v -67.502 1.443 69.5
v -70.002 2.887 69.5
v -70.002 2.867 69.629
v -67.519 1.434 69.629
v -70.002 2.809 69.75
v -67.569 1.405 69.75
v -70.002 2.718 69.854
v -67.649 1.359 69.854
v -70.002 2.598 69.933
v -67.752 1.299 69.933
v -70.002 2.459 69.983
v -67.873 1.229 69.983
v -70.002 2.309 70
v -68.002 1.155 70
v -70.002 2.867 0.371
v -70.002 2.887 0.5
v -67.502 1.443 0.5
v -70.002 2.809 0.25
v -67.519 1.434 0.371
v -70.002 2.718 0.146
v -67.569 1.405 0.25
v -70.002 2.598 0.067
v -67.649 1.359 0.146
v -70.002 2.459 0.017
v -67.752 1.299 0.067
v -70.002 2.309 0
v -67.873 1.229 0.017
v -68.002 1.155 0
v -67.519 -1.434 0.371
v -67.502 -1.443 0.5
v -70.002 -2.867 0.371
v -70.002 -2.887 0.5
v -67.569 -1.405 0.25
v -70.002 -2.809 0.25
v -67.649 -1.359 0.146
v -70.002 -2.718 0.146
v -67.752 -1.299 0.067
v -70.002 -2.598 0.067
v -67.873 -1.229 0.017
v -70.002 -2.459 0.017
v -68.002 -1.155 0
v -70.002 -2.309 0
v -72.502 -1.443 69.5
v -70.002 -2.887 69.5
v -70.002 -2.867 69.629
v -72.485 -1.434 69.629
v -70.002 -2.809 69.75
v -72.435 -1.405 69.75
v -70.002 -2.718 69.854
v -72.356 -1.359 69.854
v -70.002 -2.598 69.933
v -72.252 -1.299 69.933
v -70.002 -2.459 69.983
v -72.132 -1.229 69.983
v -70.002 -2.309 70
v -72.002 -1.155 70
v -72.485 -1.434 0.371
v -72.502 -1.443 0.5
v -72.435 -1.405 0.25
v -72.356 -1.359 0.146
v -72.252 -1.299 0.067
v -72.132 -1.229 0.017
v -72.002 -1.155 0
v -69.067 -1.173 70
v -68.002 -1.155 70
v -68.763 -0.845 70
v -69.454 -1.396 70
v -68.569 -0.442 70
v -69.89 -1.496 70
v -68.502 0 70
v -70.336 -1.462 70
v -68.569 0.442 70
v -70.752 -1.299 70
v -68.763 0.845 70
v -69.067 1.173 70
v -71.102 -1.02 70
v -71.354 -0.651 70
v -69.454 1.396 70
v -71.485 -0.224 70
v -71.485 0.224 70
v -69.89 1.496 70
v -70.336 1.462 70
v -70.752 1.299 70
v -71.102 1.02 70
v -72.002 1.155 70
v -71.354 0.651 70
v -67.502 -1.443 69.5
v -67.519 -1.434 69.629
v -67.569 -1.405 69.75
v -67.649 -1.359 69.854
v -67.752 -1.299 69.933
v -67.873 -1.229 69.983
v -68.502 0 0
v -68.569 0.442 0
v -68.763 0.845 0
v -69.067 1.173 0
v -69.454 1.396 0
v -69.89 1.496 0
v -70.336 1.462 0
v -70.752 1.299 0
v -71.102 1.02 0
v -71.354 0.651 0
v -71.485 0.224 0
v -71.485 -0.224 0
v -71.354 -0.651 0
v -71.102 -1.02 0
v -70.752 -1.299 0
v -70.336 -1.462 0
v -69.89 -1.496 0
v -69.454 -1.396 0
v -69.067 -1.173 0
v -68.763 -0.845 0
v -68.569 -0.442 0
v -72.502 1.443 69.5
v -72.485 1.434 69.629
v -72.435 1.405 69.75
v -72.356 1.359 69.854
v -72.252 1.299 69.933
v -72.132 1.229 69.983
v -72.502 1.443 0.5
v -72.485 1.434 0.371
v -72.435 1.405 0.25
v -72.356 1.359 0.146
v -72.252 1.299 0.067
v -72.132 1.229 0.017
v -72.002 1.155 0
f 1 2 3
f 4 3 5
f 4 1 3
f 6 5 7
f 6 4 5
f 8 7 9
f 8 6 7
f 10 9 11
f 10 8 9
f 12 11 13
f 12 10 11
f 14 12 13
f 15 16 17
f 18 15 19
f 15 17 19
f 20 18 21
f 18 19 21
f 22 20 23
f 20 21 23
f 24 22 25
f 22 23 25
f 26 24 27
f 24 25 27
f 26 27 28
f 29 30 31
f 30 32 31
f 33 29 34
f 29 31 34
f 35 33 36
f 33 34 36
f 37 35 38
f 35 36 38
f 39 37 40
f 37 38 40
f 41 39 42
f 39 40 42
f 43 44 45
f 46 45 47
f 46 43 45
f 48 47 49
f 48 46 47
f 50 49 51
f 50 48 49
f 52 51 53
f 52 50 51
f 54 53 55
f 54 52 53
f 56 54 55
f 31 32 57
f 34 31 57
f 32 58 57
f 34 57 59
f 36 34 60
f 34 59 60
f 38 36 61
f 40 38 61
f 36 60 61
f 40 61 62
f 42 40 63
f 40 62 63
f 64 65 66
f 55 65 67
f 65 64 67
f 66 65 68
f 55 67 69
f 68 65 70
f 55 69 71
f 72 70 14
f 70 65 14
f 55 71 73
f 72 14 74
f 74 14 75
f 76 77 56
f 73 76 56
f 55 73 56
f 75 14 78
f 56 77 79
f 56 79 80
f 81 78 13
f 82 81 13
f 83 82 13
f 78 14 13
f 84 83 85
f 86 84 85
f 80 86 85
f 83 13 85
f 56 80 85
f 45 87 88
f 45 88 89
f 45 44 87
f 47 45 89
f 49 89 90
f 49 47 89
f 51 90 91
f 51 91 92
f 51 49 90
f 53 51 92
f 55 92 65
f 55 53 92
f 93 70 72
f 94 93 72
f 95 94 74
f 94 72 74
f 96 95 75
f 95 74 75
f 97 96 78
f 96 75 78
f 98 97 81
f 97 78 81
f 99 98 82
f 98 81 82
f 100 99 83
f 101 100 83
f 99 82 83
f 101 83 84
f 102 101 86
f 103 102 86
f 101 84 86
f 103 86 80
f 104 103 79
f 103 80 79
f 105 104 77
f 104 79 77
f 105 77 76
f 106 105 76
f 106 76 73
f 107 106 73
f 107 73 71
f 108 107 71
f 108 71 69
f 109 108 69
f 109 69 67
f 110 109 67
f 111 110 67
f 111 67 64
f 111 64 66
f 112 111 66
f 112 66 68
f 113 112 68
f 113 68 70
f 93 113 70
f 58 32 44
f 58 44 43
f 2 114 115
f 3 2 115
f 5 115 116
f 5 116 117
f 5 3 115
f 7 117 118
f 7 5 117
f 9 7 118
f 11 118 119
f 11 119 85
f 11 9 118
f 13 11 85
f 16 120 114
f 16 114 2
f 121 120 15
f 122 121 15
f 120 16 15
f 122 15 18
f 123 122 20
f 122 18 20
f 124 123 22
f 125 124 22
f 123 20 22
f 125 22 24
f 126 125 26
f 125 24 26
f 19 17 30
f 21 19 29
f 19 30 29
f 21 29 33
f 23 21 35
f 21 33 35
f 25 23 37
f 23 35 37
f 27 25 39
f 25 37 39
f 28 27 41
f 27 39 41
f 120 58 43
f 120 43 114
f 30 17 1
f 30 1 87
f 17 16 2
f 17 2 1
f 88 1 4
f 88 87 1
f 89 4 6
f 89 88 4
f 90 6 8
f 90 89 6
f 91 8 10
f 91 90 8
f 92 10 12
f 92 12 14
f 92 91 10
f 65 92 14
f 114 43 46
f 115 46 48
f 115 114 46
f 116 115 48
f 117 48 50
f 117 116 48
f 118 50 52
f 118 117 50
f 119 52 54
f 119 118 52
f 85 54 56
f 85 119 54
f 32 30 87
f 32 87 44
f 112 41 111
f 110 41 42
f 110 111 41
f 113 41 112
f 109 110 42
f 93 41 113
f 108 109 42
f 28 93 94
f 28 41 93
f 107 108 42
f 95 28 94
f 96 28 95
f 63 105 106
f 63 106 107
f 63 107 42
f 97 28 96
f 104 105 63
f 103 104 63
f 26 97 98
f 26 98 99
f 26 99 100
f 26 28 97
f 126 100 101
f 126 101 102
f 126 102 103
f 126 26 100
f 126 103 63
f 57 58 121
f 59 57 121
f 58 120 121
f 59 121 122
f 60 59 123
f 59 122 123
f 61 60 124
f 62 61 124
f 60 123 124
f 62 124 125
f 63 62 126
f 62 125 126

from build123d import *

# Parameters (mm, degrees)
RESSALTO_EXTRUS_O1_DEPTH = 70
FILETE1_R                = 0.5
ESBO_O2_R                = 1.5
CORTE_EXTRUS_O1_DEPTH    = 71


with BuildPart() as part:
    # Esboço1 → Ressalto-extrusão1 (new body)
    with BuildSketch(Plane(origin=(0, 0, 0), x_dir=(-1, 0, 0), z_dir=(0, 0, -1))):
        Polygon((67.502122675, -1.443375673), (70.002122675, -2.886751346), (72.502122675, -1.443375673), (72.502122675, 1.443375673), (70.002122675, 2.886751346), (67.502122675, 1.443375673), align=None)
    extrude(amount=-RESSALTO_EXTRUS_O1_DEPTH)

    # Filete1
    filete1_edges = [part.edges().sort_by_distance(p)[0] for p in [
        (-71.252122675, -2.165063509, 70),
        (-72.502122675, 0, 70),
        (-71.252122675, 2.165063509, 70),
        (-68.752122675, 2.165063509, 70),
        (-67.502122675, 0, 70),
        (-68.752122675, 2.165063509, 0),
        (-71.252122675, 2.165063509, 0),
        (-72.502122675, 0, 0),
        (-71.252122675, -2.165063509, 0),
        (-68.752122675, -2.165063509, 0),
        (-67.502122675, 0, 0),
        (-68.752122675, -2.165063509, 70),
    ]]
    fillet(filete1_edges, radius=FILETE1_R)

    # Esboço2 → Corte-extrusão1 (cut, through all)
    with BuildSketch(Plane.XY.offset(70)):
        with Locations((-70.002122675, 0)):
            Circle(ESBO_O2_R)
    extrude(amount=-CORTE_EXTRUS_O1_DEPTH, mode=Mode.SUBTRACT)


solid = part.part
